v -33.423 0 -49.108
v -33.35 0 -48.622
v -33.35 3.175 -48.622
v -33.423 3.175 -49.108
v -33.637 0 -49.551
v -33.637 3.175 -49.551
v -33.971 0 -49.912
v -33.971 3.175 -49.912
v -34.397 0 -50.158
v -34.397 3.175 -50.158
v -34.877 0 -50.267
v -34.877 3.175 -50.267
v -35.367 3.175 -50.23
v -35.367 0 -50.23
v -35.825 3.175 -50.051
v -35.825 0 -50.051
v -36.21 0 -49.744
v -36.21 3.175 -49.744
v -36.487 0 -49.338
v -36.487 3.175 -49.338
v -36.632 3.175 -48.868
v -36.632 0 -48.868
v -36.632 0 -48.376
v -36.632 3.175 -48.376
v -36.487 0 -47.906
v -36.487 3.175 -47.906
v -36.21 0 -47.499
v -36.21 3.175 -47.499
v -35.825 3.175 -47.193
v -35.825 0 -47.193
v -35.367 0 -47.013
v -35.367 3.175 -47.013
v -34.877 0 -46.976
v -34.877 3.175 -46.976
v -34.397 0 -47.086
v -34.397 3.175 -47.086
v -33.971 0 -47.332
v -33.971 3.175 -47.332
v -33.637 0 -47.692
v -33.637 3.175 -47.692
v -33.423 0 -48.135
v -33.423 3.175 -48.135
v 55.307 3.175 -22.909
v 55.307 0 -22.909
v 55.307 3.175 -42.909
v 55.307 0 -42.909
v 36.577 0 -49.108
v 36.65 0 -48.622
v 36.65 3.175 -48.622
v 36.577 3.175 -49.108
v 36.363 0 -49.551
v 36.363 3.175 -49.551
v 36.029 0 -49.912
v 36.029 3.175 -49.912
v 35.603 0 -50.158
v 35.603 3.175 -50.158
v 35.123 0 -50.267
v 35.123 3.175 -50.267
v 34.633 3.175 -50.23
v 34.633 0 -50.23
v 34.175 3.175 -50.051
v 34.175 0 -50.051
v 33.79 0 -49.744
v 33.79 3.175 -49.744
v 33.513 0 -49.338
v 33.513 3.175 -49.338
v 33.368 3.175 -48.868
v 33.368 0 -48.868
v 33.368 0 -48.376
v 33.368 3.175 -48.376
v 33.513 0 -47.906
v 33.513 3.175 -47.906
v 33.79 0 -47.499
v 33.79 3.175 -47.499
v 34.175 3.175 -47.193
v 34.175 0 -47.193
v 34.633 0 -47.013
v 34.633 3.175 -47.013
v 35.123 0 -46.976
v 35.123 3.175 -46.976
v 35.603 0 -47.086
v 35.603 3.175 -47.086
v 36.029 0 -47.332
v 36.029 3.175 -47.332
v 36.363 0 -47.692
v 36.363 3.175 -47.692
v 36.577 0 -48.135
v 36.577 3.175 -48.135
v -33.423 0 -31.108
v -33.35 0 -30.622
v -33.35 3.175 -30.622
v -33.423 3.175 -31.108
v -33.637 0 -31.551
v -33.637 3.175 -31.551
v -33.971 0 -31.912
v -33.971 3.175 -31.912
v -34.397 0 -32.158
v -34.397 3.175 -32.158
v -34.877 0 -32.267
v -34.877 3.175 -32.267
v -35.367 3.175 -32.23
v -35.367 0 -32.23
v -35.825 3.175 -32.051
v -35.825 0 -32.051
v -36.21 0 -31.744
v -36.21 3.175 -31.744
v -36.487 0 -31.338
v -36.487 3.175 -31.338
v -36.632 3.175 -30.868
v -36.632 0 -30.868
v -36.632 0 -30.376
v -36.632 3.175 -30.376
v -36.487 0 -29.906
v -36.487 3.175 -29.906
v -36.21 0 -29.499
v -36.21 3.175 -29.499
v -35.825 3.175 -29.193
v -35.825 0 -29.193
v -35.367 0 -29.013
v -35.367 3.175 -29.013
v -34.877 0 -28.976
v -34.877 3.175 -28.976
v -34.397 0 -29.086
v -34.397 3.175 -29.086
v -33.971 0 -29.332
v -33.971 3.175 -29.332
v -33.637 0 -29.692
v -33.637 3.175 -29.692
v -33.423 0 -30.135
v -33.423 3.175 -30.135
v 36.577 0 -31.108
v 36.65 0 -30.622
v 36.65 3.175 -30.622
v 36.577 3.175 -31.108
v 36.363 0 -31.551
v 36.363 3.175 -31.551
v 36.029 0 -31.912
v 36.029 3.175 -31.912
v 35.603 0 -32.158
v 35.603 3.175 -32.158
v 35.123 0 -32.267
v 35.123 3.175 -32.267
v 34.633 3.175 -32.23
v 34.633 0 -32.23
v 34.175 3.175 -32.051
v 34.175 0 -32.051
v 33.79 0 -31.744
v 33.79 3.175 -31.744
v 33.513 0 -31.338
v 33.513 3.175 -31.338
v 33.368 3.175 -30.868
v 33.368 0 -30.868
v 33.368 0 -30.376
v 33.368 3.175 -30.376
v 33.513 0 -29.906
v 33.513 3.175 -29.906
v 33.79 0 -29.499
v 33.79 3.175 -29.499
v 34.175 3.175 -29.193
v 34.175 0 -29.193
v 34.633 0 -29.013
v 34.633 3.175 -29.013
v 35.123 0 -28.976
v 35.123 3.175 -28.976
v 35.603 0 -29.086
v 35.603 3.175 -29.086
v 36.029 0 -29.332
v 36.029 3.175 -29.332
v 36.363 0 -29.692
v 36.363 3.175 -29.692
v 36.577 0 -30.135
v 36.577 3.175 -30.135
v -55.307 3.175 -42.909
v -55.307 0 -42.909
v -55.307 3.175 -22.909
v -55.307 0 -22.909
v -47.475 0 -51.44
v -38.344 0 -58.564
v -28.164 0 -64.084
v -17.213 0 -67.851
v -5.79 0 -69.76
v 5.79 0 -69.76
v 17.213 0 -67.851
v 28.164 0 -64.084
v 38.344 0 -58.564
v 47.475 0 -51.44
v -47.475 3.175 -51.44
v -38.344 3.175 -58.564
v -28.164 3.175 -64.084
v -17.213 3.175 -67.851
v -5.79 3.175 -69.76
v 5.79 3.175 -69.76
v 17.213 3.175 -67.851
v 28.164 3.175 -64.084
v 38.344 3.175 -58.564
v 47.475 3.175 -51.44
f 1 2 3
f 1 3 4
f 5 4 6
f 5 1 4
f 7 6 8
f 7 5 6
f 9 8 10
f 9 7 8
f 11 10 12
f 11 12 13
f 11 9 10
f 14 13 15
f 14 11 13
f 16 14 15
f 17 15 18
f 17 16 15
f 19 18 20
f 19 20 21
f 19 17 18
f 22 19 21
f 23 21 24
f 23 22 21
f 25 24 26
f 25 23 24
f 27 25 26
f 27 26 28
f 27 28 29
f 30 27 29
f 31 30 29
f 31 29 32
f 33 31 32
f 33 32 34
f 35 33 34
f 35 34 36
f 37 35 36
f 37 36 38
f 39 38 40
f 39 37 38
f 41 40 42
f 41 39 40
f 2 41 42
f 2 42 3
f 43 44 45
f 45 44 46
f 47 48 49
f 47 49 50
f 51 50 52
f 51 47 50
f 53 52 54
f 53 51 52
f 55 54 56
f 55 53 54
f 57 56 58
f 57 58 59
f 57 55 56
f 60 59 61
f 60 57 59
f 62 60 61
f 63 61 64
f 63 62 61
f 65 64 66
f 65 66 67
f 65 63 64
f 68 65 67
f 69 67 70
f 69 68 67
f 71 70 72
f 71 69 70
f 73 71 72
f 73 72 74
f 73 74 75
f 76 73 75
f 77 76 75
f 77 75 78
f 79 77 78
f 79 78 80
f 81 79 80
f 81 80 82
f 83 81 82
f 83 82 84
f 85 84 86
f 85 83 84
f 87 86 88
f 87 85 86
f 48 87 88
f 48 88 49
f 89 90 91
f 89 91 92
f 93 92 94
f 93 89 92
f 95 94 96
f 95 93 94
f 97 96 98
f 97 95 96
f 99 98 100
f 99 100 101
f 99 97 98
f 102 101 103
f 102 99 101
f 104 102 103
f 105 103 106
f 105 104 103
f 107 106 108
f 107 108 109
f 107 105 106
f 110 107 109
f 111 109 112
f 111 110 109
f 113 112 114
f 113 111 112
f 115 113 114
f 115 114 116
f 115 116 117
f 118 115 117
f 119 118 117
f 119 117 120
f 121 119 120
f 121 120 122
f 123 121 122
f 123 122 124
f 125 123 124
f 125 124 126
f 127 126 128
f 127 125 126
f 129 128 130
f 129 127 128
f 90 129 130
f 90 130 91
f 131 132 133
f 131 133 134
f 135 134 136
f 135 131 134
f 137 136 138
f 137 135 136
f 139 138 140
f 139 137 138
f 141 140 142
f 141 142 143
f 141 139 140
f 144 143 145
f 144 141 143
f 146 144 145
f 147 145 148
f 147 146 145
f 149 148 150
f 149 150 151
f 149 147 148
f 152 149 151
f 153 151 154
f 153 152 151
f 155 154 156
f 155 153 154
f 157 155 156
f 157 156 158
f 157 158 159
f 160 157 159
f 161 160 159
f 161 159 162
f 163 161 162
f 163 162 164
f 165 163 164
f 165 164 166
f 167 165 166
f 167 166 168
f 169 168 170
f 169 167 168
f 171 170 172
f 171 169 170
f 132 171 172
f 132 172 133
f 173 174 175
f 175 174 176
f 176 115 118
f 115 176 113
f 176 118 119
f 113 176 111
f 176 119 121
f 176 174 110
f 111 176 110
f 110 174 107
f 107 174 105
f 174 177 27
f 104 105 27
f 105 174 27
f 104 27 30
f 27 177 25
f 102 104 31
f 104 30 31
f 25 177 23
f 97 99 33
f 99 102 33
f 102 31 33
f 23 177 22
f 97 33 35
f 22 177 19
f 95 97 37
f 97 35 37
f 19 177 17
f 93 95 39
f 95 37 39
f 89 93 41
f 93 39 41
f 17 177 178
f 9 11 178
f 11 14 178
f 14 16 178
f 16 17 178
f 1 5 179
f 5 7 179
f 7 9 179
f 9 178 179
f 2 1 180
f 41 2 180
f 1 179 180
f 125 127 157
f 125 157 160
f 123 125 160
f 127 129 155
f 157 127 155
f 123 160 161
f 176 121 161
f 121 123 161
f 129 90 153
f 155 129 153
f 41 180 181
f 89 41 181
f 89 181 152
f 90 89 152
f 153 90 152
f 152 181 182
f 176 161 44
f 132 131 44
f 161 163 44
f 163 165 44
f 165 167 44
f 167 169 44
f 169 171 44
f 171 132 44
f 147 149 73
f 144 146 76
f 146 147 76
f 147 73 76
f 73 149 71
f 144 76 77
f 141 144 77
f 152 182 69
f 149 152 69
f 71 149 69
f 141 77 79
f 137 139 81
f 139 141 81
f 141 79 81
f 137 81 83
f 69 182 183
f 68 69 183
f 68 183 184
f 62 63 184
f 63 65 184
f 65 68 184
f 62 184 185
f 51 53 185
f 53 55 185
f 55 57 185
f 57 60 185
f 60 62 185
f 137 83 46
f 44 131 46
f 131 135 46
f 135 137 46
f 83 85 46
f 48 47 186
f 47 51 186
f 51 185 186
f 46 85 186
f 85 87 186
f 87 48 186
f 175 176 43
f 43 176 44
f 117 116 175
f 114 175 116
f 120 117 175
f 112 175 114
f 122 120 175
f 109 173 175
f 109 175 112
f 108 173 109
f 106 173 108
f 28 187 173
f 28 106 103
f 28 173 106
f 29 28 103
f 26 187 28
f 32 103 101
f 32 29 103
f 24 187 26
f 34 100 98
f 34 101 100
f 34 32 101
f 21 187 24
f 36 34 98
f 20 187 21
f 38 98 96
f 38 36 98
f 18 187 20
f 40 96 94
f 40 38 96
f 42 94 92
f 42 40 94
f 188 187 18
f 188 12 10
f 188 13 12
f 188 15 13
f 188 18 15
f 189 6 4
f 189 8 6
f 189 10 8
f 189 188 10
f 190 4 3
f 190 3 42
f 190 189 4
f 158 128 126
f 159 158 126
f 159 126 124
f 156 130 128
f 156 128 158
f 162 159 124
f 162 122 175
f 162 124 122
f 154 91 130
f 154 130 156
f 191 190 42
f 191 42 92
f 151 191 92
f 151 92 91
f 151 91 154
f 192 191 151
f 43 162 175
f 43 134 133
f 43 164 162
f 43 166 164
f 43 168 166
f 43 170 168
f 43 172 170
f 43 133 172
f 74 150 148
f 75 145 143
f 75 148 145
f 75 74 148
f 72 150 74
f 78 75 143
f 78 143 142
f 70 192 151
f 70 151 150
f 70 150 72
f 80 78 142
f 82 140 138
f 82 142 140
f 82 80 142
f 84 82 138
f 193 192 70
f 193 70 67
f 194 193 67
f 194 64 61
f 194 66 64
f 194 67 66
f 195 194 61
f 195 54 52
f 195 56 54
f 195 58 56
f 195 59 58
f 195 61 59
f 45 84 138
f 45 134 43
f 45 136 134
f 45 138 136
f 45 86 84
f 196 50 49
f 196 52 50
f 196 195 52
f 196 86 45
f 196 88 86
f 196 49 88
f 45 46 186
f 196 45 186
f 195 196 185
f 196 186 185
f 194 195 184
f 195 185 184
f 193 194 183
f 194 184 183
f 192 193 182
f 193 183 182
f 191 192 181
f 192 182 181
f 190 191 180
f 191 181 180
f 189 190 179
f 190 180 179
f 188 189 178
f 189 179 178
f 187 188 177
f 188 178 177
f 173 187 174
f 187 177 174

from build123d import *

# Parameters (mm, degrees)
SKETCH1_R           = 1.65
BOSS_EXTRUDE2_DEPTH = 3.175


with BuildPart() as part:
    # Sketch1 → Boss-Extrude2 (new body)
    with BuildSketch(Plane(origin=(0, 0, 0), x_dir=(1, 0, 0), z_dir=(0, 1, 0))):
        with BuildLine():
            Line((-55.306734792, 42.908799641), (-55.306734792, 22.908799641))
            Line((-55.306734792, 22.908799641), (55.306734792, 22.908799641))
            Line((55.306734792, 22.908799641), (55.306734792, 42.908799641))
            ThreePointArc((55.306734792, 42.908799641), (0, 70), (-55.306734792, 42.908799641))
        make_face()
        with Locations((35, 48.621778265)):
            Circle(SKETCH1_R, mode=Mode.SUBTRACT)
        with Locations((35, 30.621778265)):
            Circle(SKETCH1_R, mode=Mode.SUBTRACT)
        with Locations((-35, 30.621778265)):
            Circle(SKETCH1_R, mode=Mode.SUBTRACT)
        with Locations((-35, 48.621778265)):
            Circle(SKETCH1_R, mode=Mode.SUBTRACT)
    extrude(amount=BOSS_EXTRUDE2_DEPTH)


solid = part.part
